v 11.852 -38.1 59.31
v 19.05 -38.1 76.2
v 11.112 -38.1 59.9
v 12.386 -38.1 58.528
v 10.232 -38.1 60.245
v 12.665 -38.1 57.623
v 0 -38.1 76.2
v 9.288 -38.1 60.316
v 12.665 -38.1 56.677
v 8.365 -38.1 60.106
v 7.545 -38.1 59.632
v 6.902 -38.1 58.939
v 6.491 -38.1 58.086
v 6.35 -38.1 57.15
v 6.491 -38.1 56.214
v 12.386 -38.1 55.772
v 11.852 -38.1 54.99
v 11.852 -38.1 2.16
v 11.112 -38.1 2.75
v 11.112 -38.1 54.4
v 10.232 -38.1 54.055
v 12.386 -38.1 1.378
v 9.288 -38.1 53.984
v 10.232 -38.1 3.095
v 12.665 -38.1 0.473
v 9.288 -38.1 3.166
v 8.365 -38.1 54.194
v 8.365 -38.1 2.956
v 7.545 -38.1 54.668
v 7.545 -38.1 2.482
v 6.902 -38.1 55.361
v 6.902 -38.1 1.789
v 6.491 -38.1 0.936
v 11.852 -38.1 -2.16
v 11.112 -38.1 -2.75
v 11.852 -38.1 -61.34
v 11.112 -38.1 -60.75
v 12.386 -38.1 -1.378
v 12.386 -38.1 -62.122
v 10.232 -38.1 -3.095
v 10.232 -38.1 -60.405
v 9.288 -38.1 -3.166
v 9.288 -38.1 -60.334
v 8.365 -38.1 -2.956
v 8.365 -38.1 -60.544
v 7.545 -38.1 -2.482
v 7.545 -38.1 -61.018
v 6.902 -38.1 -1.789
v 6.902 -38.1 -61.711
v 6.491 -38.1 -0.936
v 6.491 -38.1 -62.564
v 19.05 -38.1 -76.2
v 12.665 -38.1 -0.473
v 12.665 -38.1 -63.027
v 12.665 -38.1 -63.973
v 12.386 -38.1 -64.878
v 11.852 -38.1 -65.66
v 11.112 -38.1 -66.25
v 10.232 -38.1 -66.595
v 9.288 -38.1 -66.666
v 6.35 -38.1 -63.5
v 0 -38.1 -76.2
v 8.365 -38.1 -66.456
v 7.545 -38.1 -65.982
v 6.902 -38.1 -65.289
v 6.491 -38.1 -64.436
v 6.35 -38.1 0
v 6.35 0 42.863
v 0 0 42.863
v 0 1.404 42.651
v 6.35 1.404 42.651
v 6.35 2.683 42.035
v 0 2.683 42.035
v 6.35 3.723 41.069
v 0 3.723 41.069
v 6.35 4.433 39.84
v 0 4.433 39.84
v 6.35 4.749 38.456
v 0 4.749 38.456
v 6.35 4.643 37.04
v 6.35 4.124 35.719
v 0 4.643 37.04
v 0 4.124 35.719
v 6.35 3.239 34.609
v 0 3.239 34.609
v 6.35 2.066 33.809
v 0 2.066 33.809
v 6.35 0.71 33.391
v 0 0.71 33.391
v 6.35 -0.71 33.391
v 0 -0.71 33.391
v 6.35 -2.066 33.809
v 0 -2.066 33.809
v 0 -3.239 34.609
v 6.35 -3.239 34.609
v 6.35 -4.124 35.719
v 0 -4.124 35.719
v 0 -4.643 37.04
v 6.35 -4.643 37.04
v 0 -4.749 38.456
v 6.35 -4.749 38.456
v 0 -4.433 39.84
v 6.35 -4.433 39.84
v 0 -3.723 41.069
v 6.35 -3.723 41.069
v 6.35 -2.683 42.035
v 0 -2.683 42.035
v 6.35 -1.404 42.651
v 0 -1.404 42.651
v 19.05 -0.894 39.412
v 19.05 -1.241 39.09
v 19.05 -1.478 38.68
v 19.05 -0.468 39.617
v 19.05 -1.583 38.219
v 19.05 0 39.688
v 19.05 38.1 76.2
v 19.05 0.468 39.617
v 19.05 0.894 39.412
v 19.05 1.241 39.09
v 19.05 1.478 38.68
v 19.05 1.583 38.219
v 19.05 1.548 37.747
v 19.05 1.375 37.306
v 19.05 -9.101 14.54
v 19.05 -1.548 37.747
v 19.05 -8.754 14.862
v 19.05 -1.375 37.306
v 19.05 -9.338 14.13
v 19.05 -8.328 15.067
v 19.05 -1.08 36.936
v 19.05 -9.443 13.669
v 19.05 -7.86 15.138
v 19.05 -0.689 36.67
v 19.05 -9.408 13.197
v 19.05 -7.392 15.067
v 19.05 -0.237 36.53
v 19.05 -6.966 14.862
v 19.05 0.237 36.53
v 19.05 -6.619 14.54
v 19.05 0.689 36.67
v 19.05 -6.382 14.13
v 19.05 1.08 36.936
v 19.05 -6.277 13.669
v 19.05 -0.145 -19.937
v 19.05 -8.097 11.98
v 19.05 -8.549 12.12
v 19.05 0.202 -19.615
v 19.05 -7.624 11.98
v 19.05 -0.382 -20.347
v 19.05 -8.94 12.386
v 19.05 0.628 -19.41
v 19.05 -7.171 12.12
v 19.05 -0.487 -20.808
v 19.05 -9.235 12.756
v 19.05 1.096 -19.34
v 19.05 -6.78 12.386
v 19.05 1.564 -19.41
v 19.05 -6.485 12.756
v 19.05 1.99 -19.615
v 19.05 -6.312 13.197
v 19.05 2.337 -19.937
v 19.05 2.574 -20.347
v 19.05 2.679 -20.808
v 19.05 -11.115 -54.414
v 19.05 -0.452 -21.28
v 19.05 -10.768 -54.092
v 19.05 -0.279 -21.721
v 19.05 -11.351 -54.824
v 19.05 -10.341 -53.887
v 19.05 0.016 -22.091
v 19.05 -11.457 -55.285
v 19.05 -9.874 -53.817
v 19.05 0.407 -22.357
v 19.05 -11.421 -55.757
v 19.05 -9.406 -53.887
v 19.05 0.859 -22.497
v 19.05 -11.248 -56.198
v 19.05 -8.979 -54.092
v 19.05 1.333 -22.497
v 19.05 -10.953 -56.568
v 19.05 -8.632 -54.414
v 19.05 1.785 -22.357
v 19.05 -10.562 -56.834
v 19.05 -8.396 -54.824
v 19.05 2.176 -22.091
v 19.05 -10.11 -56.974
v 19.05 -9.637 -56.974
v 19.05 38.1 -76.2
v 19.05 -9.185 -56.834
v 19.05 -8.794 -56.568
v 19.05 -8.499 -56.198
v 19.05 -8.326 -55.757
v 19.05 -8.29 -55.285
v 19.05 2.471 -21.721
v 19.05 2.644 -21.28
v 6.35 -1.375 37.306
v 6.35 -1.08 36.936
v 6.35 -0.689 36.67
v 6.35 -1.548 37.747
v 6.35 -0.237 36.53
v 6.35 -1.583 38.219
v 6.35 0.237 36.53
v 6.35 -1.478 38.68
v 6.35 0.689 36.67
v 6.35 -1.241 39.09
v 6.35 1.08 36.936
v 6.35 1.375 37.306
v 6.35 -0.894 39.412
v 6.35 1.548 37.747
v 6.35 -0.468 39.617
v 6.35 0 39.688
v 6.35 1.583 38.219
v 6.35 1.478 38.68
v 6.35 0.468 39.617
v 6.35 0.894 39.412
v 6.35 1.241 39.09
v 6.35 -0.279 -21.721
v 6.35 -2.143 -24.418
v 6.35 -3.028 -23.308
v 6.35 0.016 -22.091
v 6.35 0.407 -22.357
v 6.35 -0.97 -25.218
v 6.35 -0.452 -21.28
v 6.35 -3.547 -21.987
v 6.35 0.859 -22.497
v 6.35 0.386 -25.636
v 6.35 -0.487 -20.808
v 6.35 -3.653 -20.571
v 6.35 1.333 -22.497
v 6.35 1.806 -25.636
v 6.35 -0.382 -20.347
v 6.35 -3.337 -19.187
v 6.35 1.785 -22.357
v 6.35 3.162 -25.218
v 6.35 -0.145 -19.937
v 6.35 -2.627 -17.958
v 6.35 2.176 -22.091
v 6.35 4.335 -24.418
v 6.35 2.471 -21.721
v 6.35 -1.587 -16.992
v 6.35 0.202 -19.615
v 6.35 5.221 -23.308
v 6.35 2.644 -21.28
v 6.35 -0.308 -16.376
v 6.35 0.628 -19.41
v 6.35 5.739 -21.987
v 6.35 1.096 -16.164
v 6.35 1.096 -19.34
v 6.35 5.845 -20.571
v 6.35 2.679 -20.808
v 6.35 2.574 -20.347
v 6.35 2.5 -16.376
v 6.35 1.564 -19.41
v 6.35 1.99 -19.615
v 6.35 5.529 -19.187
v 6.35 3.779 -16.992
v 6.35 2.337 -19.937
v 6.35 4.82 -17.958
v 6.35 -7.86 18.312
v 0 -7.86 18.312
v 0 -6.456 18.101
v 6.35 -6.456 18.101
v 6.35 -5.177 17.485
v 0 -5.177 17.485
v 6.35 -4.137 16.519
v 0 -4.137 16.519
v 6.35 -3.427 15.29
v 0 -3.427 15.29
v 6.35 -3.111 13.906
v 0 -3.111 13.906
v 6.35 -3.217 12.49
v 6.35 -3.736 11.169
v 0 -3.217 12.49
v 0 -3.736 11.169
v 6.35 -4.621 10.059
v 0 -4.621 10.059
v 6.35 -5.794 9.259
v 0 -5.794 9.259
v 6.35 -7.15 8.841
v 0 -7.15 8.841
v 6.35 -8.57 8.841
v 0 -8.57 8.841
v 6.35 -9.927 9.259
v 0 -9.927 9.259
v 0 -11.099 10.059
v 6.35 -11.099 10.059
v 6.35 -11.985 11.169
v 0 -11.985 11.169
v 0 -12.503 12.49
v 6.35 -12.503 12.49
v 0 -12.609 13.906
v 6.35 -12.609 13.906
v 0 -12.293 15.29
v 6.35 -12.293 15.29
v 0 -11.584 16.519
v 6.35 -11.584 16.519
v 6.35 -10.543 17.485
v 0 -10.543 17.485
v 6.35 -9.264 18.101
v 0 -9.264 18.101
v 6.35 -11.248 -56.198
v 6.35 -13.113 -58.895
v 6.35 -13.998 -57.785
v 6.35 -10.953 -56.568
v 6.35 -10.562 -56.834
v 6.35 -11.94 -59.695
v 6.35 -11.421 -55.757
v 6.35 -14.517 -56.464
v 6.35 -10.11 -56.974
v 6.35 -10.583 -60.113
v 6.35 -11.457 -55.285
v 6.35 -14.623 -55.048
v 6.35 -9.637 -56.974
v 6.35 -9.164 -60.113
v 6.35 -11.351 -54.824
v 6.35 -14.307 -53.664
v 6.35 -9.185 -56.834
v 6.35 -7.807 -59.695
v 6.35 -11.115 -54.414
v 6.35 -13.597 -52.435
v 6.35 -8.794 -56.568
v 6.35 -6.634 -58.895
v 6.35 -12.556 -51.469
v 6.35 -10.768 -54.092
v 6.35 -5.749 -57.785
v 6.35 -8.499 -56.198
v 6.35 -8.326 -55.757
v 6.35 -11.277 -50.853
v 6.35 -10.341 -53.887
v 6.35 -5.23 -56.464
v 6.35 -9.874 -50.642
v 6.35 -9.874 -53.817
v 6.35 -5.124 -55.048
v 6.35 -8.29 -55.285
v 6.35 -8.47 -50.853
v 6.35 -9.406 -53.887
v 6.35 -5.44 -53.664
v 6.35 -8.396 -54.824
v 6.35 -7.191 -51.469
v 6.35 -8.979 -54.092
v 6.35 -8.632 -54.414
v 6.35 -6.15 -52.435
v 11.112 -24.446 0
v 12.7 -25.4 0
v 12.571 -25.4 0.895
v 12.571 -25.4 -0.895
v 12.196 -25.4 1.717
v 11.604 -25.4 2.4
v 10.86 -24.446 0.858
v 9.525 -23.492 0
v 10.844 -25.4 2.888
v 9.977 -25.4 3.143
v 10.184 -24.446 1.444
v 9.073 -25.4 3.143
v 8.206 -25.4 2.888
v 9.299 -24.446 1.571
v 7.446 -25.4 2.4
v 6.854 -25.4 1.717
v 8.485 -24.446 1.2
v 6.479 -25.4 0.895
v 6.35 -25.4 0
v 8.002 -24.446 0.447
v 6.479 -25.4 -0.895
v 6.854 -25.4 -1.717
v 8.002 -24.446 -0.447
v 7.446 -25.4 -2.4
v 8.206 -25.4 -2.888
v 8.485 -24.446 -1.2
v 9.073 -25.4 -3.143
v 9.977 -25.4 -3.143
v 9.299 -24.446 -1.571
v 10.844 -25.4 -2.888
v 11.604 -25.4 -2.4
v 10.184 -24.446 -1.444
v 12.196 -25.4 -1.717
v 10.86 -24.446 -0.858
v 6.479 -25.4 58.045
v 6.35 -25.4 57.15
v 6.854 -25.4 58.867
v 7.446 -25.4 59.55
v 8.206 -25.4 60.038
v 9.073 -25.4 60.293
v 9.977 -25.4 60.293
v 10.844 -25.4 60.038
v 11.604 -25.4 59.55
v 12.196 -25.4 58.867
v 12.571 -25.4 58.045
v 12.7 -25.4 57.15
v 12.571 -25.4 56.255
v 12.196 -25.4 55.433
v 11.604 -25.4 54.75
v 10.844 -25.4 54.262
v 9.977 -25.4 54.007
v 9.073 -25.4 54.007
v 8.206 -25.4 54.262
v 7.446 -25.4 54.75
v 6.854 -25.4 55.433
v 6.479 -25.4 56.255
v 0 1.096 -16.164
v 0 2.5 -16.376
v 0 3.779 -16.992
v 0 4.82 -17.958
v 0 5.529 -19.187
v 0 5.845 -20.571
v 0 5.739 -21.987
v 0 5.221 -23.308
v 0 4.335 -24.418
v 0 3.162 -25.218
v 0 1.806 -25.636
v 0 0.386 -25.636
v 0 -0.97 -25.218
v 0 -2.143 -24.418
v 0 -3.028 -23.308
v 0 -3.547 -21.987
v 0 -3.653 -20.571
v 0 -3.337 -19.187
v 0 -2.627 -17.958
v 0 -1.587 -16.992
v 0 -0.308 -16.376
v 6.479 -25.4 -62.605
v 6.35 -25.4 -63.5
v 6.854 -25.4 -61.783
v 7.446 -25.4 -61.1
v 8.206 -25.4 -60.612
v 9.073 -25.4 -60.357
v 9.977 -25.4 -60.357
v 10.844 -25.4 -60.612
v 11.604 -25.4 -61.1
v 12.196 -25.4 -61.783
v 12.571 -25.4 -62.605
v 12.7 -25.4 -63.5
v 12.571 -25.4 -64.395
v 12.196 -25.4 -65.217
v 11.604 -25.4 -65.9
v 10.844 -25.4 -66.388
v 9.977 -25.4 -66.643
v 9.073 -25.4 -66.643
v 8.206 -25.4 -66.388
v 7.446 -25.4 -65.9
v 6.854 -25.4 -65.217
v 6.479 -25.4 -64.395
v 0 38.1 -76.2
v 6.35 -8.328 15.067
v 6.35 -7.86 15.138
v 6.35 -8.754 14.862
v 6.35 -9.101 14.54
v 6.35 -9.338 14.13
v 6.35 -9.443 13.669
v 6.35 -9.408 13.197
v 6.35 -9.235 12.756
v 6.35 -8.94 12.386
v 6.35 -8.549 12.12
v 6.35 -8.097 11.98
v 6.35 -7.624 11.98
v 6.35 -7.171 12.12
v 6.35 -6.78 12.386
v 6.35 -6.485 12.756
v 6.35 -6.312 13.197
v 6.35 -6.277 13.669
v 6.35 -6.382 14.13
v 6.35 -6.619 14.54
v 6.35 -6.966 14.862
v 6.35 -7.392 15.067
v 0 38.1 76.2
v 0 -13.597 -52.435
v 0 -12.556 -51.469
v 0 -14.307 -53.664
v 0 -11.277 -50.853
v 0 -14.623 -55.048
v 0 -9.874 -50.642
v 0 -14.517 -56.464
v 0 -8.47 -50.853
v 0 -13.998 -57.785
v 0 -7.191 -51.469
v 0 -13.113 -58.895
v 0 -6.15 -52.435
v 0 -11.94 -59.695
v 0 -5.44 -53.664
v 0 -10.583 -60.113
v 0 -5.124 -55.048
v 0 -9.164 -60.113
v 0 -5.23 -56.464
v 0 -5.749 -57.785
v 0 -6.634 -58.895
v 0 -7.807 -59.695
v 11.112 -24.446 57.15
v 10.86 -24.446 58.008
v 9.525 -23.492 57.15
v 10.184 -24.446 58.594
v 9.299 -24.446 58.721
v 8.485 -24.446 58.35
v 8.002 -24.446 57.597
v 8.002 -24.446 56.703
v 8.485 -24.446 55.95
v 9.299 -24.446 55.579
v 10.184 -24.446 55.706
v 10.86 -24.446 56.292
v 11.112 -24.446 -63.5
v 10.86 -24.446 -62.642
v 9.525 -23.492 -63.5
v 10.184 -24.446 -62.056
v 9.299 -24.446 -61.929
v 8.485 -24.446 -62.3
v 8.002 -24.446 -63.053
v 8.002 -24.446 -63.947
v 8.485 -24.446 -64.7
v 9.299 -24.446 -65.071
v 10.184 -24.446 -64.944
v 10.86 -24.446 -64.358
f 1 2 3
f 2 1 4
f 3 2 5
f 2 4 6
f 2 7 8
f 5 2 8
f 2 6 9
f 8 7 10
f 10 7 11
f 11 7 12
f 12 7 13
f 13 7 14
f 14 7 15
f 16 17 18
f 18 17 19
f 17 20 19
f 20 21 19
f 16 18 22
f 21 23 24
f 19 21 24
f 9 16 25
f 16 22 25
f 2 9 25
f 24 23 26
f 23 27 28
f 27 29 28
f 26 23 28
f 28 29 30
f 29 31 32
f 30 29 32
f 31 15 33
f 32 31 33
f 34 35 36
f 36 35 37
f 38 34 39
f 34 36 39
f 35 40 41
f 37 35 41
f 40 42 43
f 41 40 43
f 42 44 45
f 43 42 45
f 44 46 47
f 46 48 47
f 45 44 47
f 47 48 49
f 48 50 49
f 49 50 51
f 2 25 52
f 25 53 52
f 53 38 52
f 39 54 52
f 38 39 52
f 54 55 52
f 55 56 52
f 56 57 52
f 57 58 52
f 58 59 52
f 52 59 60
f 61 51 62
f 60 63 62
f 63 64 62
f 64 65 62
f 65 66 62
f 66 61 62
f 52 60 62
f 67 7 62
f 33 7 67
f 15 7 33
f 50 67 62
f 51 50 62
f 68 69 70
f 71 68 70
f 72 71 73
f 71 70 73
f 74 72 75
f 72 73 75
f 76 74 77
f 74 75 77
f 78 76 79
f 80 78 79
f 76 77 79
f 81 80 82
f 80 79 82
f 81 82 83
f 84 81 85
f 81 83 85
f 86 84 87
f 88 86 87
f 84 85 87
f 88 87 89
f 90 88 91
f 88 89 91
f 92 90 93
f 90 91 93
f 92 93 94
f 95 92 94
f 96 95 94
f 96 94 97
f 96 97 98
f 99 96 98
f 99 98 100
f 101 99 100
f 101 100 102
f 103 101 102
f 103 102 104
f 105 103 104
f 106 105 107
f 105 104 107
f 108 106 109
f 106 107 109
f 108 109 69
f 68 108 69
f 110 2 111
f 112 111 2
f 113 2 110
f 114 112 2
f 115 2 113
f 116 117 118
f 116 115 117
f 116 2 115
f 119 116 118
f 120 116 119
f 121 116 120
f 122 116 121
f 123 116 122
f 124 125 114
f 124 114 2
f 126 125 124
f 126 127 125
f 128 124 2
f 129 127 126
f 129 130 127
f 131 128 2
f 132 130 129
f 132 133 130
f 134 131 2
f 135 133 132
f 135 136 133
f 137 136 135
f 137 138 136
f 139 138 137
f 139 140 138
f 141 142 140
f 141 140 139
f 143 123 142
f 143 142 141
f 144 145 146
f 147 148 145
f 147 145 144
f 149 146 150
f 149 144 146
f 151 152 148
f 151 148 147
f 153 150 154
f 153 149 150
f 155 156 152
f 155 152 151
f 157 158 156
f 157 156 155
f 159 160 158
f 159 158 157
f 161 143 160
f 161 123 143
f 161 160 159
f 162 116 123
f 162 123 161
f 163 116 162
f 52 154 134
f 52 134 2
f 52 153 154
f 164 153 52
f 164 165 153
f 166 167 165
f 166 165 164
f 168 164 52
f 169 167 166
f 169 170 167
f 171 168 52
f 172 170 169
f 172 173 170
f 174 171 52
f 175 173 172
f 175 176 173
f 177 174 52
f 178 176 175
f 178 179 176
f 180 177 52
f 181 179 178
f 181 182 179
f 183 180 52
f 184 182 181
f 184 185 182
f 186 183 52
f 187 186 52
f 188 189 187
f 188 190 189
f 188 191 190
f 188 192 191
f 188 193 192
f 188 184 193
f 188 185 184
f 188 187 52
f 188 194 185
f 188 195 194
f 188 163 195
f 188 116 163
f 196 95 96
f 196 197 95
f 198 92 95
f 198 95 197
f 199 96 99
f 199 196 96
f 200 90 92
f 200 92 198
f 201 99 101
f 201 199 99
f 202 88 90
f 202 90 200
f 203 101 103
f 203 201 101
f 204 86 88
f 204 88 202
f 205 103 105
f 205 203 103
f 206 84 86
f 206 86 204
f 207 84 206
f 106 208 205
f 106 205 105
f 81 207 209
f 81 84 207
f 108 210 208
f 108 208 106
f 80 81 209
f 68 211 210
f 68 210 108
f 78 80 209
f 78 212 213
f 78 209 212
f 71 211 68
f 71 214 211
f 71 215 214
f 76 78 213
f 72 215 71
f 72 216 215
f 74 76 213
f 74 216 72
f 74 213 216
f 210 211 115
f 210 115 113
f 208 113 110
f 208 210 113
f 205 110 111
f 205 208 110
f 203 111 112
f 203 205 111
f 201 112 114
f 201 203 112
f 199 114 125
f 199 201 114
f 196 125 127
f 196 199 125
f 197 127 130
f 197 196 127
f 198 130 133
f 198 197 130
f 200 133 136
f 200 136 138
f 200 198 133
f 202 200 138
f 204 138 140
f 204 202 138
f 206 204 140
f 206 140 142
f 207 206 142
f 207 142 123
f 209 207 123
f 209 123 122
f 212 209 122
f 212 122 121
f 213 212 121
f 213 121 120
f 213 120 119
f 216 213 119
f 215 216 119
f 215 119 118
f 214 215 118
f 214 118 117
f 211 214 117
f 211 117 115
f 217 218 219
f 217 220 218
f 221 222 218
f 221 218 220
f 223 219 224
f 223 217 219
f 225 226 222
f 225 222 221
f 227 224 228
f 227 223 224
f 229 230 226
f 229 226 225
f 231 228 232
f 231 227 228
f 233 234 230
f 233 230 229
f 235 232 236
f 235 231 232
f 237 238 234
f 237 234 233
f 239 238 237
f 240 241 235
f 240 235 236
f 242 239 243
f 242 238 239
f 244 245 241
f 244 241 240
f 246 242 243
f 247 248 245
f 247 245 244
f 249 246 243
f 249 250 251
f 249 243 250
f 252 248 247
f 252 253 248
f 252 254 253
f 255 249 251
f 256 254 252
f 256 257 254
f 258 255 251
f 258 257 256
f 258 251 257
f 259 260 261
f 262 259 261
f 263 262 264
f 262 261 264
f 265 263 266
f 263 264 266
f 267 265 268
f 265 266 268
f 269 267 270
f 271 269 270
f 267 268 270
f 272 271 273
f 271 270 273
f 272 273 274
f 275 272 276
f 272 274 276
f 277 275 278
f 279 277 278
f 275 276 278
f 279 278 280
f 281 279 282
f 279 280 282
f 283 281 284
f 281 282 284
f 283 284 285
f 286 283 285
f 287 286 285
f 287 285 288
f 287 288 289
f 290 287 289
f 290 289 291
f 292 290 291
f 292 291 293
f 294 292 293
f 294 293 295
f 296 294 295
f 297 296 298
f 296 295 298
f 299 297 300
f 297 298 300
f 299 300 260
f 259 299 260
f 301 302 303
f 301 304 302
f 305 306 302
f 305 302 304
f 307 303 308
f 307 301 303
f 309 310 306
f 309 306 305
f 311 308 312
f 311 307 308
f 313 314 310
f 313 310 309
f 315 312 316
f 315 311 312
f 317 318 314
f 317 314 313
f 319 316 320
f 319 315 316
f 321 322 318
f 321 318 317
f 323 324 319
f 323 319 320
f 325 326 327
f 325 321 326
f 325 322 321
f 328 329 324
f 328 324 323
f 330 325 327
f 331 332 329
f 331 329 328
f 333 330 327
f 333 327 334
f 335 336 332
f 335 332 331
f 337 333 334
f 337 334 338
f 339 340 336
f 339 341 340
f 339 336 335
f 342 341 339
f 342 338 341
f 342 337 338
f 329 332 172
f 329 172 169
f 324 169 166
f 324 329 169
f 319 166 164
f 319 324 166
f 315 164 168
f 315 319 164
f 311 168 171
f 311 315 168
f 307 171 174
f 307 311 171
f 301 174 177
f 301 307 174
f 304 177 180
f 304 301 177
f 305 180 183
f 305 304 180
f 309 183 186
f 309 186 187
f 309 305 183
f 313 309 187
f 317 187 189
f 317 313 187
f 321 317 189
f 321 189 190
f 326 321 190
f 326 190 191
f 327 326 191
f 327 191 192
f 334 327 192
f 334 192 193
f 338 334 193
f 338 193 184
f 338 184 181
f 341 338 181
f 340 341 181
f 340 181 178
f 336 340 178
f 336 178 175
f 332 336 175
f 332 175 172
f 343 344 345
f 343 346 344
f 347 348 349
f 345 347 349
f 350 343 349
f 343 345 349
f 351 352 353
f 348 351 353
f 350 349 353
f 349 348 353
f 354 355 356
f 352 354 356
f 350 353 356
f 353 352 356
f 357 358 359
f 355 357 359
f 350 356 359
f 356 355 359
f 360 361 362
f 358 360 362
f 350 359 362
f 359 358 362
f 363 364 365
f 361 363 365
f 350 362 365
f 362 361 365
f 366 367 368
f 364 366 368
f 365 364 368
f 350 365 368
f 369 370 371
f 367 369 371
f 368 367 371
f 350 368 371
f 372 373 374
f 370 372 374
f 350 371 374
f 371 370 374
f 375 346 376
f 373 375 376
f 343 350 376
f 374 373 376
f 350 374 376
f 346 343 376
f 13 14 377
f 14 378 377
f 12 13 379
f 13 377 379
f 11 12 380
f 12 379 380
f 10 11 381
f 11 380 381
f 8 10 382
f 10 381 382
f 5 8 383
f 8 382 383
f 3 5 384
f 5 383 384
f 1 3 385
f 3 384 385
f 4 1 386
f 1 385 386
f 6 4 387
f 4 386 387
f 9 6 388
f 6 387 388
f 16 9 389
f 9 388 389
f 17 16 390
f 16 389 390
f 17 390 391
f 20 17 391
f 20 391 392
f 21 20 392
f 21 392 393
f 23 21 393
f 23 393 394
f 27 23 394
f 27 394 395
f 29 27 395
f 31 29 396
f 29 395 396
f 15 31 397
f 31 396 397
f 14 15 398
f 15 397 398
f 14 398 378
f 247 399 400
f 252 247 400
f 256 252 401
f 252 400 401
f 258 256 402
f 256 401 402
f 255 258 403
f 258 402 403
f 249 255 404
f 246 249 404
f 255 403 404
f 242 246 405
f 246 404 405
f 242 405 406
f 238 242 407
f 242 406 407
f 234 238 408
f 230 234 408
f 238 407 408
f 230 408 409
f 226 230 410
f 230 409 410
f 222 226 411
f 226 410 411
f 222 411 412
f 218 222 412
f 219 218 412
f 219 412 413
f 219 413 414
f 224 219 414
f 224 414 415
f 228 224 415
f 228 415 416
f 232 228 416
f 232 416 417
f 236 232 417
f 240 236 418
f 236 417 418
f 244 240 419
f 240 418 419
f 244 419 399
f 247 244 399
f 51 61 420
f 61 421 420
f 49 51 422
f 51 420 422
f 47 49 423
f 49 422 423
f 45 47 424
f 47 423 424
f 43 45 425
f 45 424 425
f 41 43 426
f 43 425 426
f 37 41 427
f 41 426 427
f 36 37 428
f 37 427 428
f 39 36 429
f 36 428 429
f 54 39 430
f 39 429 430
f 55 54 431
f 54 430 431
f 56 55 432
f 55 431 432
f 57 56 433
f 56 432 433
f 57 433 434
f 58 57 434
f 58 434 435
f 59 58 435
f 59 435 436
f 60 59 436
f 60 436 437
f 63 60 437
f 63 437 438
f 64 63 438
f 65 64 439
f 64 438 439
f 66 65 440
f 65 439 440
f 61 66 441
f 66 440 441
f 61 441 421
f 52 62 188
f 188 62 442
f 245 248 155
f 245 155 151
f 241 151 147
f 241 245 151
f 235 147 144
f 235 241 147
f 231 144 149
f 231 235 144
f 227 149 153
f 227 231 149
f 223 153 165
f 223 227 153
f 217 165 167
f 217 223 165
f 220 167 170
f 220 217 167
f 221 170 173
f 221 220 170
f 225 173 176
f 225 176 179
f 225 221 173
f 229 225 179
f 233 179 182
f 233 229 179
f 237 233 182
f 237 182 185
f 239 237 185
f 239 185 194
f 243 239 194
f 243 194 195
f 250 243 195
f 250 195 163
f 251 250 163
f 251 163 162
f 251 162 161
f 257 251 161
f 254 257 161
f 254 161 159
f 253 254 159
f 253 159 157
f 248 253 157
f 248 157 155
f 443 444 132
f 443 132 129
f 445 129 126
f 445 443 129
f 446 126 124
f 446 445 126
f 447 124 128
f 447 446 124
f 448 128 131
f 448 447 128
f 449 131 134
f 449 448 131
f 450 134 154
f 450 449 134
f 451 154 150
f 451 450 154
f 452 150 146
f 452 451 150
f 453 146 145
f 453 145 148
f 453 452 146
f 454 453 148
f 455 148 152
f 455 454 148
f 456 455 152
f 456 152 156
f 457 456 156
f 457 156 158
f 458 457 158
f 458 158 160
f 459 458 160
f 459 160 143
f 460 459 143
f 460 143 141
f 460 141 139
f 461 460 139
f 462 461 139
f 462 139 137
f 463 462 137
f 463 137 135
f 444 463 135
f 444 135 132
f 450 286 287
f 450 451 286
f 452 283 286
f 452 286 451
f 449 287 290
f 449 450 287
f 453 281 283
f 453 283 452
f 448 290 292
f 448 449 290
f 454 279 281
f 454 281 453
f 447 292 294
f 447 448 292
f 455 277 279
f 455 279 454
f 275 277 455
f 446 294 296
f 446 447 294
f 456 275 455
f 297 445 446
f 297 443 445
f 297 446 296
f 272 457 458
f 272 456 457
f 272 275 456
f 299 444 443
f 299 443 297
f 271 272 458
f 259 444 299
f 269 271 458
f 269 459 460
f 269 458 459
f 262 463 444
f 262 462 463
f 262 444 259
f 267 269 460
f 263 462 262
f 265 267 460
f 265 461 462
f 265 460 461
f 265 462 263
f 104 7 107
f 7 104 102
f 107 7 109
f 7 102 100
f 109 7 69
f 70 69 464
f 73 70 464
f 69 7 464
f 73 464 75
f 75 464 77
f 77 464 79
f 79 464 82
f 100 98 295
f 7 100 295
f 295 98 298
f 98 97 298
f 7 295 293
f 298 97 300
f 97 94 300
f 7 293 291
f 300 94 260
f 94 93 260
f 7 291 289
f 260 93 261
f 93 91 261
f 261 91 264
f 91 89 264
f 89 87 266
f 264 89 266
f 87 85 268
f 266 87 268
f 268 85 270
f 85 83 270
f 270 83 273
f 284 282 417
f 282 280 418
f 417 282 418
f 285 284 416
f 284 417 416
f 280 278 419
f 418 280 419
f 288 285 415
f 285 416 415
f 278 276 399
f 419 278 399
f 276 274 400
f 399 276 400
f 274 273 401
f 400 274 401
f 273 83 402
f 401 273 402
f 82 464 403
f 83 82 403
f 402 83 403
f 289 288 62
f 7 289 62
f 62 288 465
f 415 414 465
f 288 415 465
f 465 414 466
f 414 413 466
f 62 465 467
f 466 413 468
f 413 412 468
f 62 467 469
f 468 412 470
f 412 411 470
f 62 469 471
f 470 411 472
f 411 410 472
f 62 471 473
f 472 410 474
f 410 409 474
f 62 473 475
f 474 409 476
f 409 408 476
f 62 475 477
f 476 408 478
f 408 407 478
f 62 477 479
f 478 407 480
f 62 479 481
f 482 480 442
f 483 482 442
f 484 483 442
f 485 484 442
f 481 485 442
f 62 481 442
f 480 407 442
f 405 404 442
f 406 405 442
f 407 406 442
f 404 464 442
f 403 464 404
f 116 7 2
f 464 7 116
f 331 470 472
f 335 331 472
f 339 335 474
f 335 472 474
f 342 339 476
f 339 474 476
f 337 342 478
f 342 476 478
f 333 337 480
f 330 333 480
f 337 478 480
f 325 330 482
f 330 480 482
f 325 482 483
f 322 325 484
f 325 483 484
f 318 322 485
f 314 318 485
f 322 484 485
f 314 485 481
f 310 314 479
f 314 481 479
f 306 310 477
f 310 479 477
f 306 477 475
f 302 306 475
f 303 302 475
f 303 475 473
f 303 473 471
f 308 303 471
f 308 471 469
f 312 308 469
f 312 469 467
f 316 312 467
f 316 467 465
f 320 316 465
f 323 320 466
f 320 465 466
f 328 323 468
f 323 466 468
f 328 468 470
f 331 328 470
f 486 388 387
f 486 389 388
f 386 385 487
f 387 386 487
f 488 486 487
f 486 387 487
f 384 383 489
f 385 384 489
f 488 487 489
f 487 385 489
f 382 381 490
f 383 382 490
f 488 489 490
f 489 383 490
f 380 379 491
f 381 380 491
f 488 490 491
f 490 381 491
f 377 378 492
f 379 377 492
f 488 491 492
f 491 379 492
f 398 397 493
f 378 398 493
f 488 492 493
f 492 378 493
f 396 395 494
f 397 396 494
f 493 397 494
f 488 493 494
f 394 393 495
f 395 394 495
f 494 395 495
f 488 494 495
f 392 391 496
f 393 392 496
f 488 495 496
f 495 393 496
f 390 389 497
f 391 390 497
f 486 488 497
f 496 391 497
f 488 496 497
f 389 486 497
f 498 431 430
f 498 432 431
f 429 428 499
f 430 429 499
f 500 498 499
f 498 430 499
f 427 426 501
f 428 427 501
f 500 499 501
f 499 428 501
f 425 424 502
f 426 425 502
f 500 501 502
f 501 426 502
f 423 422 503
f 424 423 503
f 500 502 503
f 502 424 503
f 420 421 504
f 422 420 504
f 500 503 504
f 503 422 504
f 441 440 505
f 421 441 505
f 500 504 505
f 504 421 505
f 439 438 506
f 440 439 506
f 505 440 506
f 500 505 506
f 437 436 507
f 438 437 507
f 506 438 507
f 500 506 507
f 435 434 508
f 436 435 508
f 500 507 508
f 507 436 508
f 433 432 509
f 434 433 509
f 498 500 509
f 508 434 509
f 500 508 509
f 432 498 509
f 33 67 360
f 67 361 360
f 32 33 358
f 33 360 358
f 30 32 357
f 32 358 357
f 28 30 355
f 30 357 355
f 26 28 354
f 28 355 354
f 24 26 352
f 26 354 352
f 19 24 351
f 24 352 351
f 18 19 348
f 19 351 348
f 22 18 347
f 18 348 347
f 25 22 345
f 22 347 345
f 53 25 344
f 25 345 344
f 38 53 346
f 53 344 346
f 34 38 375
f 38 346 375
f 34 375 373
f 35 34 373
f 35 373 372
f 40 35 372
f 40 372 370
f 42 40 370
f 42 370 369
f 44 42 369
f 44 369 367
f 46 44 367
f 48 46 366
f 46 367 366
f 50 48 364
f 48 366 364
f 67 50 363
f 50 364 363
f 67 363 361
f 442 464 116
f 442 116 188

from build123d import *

# Parameters (mm, degrees)
SKETCH1_W                       = 152.4
SKETCH1_H                       = 76.2
SKETCH1_R                       = 1.5875
BOSS_EXTRUDE1_DEPTH             = 19.05
SKETCH2_R                       = 4.7625
CUT_EXTRUDE1_DEPTH              = 6.35
F_1_4_0_25_DIAMETER_HOLE1_D     = 6.35
F_1_4_0_25_DIAMETER_HOLE1_DEPTH = 12.7
F_1_4_0_25_DIAMETER_HOLE1_TIP   = 1.907732465


with BuildPart() as part:
    # Sketch1 → Boss-Extrude1 (new body)
    with BuildSketch(Plane(origin=(0, 0, 0), x_dir=(0, 0, -1), z_dir=(1, 0, 0))):
        Rectangle(SKETCH1_W, SKETCH1_H)
        with Locations((20.927, 1.096077429)):
            Circle(SKETCH1_R, mode=Mode.SUBTRACT)
        with Locations((-38.1, 0)):
            Circle(SKETCH1_R, mode=Mode.SUBTRACT)
        with Locations((55.404, -9.873506971)):
            Circle(SKETCH1_R, mode=Mode.SUBTRACT)
        with Locations((-13.55, -7.860160654)):
            Circle(SKETCH1_R, mode=Mode.SUBTRACT)
    extrude(amount=BOSS_EXTRUDE1_DEPTH)

    # Sketch2 → Cut-Extrude1 (cut)
    with BuildSketch(Plane.ZY):
        with Locations((38.1, 0)):
            Circle(SKETCH2_R)
        with Locations((13.55, -7.860160654)):
            Circle(SKETCH2_R)
        with Locations((-20.927, 1.096077429)):
            Circle(SKETCH2_R)
        with Locations((-55.404, -9.873506971)):
            Circle(SKETCH2_R)
    extrude(amount=-CUT_EXTRUDE1_DEPTH, mode=Mode.SUBTRACT)

    # 1/4 (0.25) Diameter Hole1
    with Locations(Plane.XZ.offset(38.1)):
        with Locations((9.525, -63.5), (9.525, 0), (9.525, 57.15)):
            Hole(F_1_4_0_25_DIAMETER_HOLE1_D / 2, depth=F_1_4_0_25_DIAMETER_HOLE1_DEPTH)
            with Locations((0, 0, -(F_1_4_0_25_DIAMETER_HOLE1_DEPTH + F_1_4_0_25_DIAMETER_HOLE1_TIP / 2))):  # 118° drill point
                Cone(0, F_1_4_0_25_DIAMETER_HOLE1_D / 2, F_1_4_0_25_DIAMETER_HOLE1_TIP, mode=Mode.SUBTRACT)


solid = part.part
